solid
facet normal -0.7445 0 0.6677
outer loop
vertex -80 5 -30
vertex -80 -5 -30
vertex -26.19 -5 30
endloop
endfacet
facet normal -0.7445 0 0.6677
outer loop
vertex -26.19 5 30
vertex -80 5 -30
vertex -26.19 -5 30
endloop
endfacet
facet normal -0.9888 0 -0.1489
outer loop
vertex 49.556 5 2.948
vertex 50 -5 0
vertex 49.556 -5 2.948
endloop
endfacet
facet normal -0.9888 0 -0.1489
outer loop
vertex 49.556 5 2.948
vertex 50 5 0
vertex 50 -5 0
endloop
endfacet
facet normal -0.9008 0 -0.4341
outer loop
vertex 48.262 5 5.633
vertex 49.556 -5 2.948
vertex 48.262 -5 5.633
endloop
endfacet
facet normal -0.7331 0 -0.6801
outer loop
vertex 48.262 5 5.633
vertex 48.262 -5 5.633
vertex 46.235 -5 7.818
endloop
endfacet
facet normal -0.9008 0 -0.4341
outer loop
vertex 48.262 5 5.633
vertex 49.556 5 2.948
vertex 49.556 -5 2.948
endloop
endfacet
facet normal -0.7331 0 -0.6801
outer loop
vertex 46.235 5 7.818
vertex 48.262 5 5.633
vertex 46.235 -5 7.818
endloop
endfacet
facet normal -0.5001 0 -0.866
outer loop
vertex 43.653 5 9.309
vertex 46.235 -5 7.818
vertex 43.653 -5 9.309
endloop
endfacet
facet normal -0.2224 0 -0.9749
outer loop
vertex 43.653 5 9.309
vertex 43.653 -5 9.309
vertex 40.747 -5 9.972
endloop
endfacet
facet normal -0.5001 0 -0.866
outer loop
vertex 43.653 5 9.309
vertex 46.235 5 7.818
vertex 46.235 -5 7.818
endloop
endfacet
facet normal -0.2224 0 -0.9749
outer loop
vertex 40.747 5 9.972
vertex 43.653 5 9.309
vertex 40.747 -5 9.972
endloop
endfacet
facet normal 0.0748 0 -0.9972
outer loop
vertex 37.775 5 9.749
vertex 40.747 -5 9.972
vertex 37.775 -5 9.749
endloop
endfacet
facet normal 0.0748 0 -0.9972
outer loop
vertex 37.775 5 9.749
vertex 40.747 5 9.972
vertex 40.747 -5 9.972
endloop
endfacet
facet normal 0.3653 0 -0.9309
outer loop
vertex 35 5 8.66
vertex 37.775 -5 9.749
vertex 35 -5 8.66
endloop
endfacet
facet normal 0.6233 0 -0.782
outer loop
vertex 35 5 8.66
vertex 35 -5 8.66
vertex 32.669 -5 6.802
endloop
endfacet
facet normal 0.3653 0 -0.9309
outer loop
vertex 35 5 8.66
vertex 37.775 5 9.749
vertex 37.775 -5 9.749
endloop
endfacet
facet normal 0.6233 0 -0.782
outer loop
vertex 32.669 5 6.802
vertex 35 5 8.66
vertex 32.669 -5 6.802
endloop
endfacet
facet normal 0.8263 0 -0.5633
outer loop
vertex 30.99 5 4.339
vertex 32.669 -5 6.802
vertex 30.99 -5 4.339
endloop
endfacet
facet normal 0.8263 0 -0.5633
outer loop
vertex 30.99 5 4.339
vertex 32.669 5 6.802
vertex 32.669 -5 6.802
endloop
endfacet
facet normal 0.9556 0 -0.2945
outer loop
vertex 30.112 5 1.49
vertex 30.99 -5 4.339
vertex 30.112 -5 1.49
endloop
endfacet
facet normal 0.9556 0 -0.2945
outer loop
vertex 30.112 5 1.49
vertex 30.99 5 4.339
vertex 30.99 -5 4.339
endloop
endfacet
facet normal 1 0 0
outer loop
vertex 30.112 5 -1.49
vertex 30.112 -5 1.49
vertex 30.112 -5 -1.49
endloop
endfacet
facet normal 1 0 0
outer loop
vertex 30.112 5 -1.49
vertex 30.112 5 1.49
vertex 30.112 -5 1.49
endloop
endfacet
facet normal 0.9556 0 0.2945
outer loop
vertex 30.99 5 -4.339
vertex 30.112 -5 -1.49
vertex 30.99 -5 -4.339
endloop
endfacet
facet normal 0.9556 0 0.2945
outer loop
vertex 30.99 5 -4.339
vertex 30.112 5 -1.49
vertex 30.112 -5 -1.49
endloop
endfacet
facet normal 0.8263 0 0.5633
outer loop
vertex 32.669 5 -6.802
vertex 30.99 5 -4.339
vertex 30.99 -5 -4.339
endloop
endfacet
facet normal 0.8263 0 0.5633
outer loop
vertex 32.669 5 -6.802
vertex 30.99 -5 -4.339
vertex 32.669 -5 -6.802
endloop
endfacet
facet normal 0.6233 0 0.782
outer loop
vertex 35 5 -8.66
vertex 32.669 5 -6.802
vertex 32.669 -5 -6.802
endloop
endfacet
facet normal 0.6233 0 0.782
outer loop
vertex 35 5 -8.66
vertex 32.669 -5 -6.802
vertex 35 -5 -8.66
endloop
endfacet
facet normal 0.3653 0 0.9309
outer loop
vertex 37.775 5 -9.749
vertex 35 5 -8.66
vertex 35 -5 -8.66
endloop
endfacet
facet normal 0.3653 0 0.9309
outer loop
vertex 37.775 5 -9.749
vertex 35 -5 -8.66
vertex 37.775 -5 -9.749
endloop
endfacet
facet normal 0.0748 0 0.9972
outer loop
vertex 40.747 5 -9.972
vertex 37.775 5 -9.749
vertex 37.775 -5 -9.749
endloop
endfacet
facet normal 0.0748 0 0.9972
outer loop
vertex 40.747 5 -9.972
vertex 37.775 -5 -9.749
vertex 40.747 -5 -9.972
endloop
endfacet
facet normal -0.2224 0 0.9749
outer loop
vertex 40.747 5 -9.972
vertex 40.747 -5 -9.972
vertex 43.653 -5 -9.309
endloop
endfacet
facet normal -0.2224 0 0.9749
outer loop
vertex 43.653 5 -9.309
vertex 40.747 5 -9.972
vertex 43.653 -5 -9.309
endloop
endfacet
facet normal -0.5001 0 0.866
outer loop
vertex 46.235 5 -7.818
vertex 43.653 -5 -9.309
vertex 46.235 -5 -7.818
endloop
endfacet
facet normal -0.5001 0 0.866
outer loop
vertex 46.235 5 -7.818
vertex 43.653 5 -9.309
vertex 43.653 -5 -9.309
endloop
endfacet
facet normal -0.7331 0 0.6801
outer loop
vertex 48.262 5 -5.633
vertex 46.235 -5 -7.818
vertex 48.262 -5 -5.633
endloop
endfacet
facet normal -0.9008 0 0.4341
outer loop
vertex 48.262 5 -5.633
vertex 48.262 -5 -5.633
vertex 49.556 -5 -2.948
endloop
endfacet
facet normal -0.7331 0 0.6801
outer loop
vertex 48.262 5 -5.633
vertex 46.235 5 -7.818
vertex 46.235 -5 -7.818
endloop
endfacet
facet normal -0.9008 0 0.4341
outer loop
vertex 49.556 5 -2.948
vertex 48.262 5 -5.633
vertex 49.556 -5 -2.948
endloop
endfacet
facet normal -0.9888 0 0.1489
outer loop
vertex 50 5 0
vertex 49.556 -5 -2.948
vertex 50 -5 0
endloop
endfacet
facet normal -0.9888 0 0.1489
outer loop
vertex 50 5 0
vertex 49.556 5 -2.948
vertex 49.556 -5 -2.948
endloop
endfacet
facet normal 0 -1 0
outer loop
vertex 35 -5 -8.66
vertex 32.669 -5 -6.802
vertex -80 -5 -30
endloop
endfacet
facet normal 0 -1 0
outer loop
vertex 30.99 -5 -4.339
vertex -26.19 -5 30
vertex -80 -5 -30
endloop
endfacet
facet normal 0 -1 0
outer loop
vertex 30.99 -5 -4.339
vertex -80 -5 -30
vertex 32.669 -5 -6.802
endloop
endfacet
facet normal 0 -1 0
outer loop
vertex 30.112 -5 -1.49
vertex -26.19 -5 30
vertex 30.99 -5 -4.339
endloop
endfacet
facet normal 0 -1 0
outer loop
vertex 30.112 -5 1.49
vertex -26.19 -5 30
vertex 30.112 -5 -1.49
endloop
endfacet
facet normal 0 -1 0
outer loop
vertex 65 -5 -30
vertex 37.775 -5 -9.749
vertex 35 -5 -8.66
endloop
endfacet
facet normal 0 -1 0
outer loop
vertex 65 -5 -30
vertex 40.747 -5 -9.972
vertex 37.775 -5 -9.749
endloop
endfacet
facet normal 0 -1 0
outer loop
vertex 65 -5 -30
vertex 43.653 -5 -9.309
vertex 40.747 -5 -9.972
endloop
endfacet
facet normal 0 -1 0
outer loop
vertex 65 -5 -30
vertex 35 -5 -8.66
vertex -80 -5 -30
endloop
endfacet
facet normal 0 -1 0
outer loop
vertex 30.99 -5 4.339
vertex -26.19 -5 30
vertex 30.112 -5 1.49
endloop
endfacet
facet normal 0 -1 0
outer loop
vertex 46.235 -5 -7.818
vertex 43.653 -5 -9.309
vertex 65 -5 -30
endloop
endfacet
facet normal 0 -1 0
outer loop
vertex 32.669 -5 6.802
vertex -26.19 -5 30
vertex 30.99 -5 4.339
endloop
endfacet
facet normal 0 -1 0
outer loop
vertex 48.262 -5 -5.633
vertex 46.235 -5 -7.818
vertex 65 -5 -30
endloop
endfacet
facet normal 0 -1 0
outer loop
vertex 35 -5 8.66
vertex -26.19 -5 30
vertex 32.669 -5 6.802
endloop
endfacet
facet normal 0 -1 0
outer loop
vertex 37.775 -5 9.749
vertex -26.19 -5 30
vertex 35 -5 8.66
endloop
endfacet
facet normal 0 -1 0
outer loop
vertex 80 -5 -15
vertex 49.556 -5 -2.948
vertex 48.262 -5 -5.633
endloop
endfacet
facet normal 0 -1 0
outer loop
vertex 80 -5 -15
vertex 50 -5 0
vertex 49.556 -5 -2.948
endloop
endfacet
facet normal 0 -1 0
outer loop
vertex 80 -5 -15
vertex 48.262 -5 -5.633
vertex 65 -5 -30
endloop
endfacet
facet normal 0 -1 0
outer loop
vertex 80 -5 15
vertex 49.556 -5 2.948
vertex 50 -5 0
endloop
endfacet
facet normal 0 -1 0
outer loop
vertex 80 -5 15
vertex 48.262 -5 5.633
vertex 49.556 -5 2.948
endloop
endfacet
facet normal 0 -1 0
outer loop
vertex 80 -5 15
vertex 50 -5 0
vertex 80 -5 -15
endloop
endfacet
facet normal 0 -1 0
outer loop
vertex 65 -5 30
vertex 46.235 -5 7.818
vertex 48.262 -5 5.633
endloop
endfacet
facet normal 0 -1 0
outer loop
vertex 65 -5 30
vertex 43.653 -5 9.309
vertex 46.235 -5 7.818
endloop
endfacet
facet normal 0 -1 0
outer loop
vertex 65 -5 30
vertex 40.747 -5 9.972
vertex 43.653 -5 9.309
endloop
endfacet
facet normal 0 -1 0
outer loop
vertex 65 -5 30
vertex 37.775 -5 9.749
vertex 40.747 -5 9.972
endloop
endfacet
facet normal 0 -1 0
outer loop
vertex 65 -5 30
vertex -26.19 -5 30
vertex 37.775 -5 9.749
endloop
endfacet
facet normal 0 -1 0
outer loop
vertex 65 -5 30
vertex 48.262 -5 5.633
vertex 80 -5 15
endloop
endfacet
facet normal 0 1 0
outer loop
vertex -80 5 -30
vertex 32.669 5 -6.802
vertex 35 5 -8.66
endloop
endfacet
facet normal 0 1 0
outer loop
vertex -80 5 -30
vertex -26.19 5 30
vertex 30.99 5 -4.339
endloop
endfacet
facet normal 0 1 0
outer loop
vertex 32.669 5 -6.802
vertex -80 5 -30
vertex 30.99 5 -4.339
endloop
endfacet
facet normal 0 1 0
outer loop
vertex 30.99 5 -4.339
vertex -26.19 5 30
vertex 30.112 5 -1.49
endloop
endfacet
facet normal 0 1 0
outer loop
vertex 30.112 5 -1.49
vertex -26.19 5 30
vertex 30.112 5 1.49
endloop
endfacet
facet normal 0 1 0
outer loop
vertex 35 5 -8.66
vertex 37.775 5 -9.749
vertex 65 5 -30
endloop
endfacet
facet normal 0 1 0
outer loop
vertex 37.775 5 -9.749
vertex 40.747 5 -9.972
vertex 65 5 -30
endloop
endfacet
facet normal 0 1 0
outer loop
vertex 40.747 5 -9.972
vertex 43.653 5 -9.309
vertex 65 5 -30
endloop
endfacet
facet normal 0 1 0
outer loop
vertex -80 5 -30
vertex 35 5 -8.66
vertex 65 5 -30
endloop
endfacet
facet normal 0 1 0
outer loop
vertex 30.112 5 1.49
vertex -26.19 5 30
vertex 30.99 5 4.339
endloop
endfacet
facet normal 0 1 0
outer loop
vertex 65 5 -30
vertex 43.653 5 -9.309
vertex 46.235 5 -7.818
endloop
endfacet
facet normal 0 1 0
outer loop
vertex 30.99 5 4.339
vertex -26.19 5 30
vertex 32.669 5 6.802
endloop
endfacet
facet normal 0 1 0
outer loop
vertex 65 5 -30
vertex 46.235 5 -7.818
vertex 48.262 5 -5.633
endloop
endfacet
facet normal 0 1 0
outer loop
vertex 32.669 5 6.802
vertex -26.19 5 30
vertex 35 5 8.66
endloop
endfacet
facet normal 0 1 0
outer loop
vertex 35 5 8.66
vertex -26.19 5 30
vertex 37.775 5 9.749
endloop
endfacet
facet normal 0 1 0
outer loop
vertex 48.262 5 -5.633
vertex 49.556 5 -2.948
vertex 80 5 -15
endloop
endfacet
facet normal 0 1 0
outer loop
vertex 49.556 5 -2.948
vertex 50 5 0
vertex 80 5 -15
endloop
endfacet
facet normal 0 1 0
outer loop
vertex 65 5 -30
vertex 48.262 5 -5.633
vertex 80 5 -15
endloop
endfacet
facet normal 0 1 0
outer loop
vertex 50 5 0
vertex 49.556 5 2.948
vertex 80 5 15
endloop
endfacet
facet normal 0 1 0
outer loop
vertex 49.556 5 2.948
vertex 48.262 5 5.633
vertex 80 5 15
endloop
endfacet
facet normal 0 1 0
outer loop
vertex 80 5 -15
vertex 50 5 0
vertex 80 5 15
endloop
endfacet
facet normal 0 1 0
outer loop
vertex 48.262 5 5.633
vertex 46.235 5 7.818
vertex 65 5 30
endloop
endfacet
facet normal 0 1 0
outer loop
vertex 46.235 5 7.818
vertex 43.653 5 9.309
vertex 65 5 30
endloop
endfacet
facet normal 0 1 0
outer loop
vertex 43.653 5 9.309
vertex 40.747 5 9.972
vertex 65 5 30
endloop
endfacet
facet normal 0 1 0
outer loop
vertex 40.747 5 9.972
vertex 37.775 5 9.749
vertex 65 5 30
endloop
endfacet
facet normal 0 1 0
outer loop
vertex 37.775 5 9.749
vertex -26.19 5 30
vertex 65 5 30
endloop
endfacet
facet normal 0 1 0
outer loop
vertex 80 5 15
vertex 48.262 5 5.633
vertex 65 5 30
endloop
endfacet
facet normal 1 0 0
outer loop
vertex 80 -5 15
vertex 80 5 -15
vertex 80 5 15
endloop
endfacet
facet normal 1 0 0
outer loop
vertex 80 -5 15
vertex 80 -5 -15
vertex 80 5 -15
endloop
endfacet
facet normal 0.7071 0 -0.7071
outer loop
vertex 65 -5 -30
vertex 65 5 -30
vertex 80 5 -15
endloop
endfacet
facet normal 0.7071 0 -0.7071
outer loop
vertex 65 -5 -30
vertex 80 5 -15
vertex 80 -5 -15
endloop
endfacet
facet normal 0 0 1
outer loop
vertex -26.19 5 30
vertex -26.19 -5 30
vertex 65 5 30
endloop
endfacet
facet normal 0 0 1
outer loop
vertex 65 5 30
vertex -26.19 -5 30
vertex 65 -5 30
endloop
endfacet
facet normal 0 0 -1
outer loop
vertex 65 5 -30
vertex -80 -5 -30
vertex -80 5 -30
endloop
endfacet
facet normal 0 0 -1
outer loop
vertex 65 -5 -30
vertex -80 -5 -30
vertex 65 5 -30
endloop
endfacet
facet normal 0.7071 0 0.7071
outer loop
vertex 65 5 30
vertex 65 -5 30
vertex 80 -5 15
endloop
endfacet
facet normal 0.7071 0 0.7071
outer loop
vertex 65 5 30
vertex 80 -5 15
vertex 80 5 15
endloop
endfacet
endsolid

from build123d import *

# Parameters (mm, degrees)
F0_W     = 160
F0_H     = 60
F0_R     = 10
F1_DEPTH = 5
F2_SIZE  = 15
F4_DEPTH = 25


with BuildPart() as f1:
    # F0 (on Front) → F1 (new body, symmetric)
    with BuildSketch(Plane.XZ):
        Rectangle(F0_W, F0_H)
        with Locations((40, 0)):
            Circle(F0_R, mode=Mode.SUBTRACT)
    extrude(amount=F1_DEPTH, both=True)

    # F2
    f2_edges = [f1.edges().sort_by_distance(p)[0] for p in [
        (80, 0, 30),
        (80, 0, -30),
    ]]
    chamfer(f2_edges, length=F2_SIZE)

    # F3 (on face) → F4 (cut)
    with BuildSketch(Plane.XZ.offset(5)):
        Polygon((-80, 30), (-80, -30), (-26.189647, 30), align=None)
    extrude(amount=-F4_DEPTH, mode=Mode.SUBTRACT)


solid = f1.part
